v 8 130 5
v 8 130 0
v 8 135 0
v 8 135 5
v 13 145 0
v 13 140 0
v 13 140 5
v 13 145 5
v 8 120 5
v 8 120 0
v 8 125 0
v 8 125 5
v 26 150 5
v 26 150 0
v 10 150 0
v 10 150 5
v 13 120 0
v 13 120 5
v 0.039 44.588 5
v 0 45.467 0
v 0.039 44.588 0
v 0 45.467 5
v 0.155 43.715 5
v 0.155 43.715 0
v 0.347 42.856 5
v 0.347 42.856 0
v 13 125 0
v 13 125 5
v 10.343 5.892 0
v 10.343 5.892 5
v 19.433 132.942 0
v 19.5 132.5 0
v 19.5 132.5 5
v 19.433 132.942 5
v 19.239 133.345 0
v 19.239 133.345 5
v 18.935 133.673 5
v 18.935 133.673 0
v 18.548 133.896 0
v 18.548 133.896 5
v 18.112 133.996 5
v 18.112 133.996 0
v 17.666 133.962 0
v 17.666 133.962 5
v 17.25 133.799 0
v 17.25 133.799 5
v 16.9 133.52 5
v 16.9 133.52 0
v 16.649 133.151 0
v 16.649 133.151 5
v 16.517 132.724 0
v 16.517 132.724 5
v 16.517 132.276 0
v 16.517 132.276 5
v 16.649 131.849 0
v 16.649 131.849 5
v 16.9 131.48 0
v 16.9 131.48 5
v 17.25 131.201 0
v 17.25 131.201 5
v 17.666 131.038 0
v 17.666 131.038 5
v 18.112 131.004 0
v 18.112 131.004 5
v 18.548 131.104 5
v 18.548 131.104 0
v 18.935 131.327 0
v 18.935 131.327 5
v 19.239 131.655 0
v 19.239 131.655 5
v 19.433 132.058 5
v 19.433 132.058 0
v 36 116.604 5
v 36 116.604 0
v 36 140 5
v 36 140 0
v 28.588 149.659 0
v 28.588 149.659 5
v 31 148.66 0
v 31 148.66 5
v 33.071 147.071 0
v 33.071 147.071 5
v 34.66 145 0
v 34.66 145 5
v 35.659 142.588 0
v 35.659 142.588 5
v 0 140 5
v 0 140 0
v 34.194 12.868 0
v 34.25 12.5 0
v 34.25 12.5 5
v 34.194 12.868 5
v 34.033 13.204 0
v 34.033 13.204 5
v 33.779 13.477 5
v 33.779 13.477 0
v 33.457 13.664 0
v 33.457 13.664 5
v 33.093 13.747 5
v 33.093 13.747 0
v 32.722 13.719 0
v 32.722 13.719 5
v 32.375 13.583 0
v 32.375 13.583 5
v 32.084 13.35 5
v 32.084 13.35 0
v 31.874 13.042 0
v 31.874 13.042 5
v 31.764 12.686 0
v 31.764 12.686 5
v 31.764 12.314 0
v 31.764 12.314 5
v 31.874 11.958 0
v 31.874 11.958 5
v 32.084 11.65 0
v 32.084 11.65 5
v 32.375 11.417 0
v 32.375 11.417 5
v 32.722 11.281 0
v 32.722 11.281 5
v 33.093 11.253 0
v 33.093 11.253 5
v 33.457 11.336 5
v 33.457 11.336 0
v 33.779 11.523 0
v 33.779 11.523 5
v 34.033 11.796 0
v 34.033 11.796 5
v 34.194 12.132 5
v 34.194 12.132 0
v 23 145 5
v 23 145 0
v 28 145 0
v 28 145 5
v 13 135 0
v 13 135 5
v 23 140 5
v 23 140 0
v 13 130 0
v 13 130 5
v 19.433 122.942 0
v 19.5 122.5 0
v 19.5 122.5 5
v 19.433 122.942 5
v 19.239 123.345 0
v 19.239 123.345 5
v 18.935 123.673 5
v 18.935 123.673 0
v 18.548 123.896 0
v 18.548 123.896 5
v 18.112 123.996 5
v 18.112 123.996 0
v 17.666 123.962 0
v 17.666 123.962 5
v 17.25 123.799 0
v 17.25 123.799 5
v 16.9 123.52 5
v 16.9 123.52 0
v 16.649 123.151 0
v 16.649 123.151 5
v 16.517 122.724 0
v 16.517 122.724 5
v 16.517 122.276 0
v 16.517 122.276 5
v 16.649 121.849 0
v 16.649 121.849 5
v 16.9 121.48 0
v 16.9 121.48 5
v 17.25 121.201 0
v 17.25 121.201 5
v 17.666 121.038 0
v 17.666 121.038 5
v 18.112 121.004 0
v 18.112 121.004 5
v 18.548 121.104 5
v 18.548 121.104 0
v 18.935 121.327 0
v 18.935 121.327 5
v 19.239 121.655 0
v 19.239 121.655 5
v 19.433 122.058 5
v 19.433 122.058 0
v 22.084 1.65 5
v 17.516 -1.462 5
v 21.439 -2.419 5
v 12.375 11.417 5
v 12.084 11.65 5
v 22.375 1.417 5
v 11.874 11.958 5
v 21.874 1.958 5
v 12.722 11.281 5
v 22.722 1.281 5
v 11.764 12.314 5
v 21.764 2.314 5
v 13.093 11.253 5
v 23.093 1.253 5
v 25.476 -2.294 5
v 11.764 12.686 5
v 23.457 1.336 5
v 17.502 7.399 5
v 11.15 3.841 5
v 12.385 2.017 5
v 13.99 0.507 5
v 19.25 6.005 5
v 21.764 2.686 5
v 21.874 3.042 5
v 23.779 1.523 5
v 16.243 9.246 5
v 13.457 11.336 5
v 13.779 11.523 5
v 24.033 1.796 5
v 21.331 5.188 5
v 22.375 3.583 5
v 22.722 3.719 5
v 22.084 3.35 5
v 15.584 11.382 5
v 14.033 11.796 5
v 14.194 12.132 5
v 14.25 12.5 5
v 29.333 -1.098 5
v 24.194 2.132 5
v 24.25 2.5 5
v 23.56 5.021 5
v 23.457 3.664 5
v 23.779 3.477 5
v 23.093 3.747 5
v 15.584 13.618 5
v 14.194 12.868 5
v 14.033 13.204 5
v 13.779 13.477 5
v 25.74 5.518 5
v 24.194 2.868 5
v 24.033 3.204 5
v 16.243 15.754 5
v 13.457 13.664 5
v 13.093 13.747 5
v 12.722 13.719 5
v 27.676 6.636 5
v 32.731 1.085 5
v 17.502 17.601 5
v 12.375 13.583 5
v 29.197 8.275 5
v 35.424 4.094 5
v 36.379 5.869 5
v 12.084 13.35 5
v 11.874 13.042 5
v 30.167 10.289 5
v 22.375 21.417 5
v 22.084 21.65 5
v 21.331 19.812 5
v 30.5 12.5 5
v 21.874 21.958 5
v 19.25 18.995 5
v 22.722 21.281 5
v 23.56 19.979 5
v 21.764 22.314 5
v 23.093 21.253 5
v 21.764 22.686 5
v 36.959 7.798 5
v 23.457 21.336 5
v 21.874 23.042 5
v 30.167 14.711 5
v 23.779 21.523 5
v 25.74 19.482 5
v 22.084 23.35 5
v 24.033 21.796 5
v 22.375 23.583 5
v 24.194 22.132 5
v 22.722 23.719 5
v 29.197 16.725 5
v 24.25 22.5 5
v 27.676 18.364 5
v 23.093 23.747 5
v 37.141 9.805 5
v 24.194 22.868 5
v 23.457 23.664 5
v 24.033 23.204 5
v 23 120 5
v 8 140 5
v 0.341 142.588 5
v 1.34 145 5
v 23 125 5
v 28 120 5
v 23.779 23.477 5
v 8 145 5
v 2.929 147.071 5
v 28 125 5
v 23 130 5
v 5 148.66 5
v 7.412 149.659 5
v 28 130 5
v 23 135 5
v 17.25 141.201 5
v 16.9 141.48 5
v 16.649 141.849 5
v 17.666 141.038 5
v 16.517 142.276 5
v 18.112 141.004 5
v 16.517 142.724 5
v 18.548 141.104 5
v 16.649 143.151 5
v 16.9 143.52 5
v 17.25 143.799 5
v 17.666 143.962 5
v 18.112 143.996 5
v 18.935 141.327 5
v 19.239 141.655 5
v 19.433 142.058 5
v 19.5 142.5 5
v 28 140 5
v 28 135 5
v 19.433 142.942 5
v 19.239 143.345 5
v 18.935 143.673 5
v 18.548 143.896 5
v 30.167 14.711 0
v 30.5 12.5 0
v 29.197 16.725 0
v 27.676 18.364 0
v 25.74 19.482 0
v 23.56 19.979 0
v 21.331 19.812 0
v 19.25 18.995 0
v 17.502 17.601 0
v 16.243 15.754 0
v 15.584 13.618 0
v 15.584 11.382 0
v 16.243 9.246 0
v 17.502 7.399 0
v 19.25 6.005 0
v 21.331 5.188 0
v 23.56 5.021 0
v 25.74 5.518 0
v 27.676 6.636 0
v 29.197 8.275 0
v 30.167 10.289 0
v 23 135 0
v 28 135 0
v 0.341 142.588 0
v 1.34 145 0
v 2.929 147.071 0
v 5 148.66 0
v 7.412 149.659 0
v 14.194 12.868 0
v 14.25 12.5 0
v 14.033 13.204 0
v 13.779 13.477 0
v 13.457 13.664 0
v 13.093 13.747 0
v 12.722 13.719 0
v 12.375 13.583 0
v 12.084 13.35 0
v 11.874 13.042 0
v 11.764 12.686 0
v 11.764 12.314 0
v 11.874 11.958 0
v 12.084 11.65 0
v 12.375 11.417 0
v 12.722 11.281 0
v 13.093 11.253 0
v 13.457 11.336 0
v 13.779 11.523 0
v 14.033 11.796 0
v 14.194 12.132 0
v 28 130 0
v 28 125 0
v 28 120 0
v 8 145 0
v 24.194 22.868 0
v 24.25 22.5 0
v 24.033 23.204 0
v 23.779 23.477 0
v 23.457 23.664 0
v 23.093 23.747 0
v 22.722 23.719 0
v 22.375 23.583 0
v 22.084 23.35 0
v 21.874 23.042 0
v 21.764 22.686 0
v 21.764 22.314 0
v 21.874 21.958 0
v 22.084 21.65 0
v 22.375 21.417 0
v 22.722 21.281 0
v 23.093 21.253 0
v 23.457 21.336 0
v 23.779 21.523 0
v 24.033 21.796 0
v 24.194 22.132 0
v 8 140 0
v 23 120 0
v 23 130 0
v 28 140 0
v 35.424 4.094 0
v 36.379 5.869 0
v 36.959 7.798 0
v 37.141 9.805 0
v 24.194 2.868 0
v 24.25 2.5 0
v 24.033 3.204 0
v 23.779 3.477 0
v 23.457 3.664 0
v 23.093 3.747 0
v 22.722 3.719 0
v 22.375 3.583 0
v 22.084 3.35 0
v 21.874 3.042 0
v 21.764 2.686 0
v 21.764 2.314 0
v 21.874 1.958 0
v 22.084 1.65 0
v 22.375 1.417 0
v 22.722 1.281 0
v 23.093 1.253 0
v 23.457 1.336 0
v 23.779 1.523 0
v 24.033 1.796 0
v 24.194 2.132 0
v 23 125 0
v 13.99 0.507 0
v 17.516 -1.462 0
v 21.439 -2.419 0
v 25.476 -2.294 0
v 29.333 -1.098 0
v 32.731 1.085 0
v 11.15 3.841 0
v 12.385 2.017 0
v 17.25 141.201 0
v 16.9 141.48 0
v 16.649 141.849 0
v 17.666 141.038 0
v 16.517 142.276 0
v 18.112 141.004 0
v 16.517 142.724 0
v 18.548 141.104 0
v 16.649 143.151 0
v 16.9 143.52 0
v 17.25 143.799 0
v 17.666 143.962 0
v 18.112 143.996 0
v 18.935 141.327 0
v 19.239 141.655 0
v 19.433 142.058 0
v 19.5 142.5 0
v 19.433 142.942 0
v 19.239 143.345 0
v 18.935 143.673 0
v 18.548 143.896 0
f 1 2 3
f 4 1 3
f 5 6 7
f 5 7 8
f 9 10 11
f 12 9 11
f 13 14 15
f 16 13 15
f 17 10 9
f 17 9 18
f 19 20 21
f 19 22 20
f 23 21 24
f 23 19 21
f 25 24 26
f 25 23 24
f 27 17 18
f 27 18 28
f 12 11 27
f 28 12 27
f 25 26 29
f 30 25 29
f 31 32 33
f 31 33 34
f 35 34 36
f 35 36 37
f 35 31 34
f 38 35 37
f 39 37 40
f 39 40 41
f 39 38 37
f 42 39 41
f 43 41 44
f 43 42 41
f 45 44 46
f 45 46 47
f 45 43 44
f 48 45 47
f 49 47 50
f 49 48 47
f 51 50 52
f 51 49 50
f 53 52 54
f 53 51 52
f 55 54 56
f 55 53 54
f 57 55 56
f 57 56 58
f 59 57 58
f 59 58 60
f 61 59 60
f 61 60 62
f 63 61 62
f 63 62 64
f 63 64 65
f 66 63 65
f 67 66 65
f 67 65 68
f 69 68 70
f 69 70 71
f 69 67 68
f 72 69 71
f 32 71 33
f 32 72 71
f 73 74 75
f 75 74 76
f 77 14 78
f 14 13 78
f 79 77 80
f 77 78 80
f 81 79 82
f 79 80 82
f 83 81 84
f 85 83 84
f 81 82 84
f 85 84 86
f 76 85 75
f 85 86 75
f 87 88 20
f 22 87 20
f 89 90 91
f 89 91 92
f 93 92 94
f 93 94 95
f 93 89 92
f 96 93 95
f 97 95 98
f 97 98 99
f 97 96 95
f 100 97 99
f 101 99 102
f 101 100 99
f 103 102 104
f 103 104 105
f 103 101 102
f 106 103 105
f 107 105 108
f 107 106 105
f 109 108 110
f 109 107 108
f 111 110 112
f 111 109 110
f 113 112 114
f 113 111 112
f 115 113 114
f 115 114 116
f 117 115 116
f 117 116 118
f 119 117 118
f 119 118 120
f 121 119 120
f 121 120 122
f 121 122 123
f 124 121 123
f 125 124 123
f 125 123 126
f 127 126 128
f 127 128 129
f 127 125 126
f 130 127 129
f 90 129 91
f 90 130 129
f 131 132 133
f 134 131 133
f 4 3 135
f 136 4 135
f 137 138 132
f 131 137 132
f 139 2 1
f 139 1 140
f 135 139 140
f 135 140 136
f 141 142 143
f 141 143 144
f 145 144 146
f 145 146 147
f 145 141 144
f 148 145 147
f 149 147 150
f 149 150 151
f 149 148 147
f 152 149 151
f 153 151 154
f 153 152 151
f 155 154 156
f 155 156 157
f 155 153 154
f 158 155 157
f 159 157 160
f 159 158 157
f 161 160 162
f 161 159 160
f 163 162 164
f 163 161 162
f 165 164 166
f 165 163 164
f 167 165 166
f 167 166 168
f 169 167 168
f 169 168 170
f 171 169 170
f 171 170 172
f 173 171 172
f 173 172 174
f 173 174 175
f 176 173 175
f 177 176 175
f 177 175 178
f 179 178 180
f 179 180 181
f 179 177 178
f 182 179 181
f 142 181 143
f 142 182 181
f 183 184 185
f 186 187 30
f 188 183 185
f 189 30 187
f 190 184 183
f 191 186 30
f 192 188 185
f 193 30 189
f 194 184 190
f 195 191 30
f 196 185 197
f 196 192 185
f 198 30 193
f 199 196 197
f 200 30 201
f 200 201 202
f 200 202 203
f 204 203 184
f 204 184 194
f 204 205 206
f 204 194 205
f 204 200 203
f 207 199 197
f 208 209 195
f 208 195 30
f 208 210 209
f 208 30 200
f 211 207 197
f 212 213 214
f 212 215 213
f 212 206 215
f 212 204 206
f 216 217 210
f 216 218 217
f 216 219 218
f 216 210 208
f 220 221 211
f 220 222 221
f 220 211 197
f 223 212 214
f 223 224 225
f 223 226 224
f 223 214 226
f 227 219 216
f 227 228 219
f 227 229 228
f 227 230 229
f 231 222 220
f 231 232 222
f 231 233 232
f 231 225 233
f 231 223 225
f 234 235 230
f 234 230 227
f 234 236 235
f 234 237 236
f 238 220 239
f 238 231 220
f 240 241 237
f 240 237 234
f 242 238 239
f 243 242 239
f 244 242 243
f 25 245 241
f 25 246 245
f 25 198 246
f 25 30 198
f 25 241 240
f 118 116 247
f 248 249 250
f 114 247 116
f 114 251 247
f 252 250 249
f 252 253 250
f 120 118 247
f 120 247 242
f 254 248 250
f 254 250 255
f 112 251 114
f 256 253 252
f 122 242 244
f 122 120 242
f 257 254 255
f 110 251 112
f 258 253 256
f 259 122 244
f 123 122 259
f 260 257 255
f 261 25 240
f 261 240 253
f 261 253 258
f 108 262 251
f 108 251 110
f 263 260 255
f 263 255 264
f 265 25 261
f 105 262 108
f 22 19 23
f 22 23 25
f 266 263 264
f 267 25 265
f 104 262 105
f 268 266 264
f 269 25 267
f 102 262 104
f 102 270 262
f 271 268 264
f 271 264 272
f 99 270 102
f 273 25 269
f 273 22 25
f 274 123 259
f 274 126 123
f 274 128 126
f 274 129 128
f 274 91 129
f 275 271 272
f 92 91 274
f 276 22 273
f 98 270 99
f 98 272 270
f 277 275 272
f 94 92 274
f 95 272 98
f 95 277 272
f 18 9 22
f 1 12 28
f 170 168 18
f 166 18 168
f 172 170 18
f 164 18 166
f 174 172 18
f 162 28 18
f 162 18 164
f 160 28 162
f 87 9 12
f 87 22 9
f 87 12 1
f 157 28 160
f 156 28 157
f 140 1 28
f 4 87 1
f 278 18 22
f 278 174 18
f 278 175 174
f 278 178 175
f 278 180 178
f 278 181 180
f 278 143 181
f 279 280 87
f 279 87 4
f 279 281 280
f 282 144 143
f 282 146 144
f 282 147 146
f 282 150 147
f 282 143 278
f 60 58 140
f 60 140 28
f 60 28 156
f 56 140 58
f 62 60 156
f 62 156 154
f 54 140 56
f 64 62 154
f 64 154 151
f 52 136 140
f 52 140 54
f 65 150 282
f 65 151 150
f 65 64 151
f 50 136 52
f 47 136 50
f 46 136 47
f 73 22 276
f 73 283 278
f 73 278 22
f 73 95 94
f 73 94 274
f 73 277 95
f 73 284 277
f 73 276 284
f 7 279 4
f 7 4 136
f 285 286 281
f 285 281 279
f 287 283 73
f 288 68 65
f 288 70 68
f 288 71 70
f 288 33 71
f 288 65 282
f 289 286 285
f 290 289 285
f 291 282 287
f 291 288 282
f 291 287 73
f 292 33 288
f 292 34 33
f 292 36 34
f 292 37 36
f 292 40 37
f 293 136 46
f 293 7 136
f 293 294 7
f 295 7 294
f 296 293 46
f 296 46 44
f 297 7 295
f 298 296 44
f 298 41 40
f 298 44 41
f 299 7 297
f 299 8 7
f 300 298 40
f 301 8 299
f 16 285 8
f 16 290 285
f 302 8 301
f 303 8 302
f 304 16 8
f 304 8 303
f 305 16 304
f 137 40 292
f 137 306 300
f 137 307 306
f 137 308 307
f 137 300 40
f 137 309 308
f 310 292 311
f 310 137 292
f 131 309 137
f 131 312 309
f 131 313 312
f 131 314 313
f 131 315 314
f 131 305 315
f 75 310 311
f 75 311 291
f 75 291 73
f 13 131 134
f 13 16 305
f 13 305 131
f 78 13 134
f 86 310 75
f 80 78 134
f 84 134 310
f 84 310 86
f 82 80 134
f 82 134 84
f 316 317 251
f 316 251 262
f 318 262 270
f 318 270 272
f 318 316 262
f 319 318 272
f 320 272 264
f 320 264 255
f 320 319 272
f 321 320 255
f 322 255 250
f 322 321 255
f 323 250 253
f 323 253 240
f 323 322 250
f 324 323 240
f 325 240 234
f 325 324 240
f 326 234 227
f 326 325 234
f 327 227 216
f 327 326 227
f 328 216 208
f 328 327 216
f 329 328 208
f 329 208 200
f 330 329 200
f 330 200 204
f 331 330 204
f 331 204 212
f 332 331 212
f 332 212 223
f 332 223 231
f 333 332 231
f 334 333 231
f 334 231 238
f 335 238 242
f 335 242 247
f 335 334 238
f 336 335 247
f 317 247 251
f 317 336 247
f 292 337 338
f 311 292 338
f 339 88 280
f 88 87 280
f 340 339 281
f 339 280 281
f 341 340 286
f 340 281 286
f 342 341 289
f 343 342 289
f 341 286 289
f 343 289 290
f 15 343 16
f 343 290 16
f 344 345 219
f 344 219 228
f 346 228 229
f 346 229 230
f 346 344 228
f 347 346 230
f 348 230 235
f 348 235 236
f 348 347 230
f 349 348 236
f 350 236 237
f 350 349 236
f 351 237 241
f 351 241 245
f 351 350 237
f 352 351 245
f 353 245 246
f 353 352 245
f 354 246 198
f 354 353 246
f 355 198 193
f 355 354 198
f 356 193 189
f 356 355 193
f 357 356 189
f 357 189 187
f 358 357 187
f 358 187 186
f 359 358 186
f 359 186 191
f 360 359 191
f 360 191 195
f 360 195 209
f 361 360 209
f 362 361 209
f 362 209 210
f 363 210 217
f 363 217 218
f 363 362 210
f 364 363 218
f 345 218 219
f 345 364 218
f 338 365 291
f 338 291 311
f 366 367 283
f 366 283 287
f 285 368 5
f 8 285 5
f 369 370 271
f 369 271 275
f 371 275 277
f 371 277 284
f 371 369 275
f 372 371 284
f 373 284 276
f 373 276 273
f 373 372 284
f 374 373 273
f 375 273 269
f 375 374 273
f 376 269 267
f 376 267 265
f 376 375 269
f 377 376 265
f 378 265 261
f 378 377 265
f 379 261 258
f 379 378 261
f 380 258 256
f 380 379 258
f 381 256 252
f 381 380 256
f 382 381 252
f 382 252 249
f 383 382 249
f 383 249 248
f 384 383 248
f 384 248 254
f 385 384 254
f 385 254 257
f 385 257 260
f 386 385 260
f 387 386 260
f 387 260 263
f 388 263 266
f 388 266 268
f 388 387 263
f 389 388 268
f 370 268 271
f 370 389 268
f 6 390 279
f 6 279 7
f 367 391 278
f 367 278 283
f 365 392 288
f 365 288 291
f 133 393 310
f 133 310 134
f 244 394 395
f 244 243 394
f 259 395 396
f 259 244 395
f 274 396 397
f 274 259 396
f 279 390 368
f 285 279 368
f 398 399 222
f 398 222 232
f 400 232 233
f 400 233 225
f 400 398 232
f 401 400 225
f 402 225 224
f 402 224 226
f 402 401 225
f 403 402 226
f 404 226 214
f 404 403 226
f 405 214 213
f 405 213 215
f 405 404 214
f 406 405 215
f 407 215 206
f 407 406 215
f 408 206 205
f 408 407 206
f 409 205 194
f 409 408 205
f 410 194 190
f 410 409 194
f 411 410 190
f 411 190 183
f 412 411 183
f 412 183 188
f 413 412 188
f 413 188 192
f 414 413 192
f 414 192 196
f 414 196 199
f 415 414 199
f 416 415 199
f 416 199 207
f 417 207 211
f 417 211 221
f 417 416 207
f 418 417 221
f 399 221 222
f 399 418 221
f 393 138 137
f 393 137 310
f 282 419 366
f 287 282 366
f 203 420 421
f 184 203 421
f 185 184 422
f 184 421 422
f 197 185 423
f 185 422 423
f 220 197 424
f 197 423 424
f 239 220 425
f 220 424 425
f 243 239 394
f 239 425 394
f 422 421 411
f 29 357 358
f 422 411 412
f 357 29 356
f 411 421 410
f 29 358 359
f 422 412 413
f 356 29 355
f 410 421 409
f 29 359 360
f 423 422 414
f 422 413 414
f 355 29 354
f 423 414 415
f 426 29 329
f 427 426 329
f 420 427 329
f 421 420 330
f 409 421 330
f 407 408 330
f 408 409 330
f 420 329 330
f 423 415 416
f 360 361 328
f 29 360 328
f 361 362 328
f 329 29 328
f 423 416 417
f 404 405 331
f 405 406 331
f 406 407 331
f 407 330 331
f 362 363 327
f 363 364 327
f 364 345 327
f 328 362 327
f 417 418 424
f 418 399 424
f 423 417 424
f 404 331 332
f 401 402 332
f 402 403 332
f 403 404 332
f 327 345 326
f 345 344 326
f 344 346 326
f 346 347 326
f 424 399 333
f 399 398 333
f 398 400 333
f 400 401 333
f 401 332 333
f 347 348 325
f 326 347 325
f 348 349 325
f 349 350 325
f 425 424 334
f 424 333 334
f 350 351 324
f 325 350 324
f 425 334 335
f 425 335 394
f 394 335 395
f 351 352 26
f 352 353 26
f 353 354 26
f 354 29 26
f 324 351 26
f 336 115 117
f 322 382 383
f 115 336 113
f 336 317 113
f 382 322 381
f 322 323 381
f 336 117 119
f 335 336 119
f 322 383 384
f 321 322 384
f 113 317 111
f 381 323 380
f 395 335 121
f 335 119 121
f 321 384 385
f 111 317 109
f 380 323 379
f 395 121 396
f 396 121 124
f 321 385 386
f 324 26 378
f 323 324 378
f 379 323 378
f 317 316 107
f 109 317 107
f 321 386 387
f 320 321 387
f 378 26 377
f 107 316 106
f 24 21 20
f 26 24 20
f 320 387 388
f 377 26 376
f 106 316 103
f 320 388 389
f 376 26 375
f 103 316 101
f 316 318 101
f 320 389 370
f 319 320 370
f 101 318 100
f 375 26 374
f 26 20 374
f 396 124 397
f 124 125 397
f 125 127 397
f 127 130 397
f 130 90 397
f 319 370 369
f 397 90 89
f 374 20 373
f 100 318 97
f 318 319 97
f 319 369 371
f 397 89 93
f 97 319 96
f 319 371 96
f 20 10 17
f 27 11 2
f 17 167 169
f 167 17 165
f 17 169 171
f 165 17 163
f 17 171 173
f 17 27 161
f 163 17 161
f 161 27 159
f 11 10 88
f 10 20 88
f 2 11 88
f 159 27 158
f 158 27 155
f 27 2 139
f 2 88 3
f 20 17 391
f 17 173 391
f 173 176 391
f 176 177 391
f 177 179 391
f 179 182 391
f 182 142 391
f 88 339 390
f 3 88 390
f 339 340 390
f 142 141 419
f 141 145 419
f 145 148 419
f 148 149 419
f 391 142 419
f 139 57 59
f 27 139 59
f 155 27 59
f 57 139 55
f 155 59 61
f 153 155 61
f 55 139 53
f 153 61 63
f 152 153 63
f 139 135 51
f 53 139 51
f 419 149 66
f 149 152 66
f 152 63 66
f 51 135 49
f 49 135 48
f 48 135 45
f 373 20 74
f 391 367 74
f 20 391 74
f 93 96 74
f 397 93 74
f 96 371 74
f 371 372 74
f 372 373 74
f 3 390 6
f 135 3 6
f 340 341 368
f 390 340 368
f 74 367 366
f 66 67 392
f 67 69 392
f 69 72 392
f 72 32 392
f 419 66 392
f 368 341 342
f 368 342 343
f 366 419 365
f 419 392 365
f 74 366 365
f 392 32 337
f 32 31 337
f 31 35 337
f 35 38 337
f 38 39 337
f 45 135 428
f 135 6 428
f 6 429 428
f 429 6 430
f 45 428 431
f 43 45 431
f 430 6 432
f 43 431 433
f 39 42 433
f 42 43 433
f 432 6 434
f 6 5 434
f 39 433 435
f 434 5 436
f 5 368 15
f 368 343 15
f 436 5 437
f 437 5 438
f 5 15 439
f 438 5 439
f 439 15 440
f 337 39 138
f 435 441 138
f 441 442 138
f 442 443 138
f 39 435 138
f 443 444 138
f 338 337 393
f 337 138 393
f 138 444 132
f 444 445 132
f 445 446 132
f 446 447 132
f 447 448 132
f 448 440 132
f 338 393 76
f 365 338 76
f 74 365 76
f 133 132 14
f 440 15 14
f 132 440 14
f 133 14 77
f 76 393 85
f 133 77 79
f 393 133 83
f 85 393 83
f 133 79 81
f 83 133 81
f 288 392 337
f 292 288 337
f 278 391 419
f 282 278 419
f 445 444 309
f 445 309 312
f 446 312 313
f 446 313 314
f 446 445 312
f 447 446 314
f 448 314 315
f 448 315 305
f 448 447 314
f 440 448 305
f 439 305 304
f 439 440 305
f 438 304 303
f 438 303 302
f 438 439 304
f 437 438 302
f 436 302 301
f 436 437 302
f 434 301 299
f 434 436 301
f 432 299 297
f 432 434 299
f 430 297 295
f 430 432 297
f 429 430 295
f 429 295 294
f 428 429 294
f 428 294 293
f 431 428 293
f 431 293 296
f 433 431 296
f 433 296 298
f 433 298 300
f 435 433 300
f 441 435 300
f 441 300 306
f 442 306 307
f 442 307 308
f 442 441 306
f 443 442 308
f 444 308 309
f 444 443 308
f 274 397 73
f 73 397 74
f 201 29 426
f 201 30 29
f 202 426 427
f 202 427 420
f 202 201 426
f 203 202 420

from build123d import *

# Parameters (mm, degrees)
SKETCH1_R           = 7.5
SKETCH1_R_2         = 1.25
SKETCH1_R_3         = 1.5
SKETCH1_W           = 5
SKETCH1_H           = 5
BOSS_EXTRUDE1_DEPTH = 5
FILLET1_R           = 10
FILLET2_R           = 10


with BuildPart() as part:
    # Sketch1 → Boss-Extrude1 (new body)
    with BuildSketch(Plane.XY):
        with BuildLine():
            Line((0, 44.138584039), (10.984892076, 3.520179201))
            ThreePointArc((10.984892076, 3.520179201), (25.289734382, -2.324207111), (37.164554201, 7.563867476))
            Line((37.164554201, 7.563867476), (36, 116.603941586))
            Line((36, 116.603941586), (36, 150))
            Line((36, 150), (0, 150))
            Line((0, 150), (0, 44.138584039))
        make_face()
        with Locations((23, 12.5)):
            Circle(SKETCH1_R, mode=Mode.SUBTRACT)
        with Locations((23, 22.5)):
            Circle(SKETCH1_R_2, mode=Mode.SUBTRACT)
        with Locations((13, 12.5)):
            Circle(SKETCH1_R_2, mode=Mode.SUBTRACT)
        with Locations((23, 2.5)):
            Circle(SKETCH1_R_2, mode=Mode.SUBTRACT)
        with Locations((33, 12.5)):
            Circle(SKETCH1_R_2, mode=Mode.SUBTRACT)
        with Locations((18, 142.5)):
            Circle(SKETCH1_R_3, mode=Mode.SUBTRACT)
        with Locations((18, 122.5)):
            Circle(SKETCH1_R_3, mode=Mode.SUBTRACT)
        with Locations((18, 132.5)):
            Circle(SKETCH1_R_3, mode=Mode.SUBTRACT)
        with Locations((10.5, 142.5)):
            Rectangle(SKETCH1_W, SKETCH1_H, mode=Mode.SUBTRACT)
        with Locations((25.5, 142.5)):
            Rectangle(SKETCH1_W, SKETCH1_H, mode=Mode.SUBTRACT)
        with Locations((10.5, 122.5)):
            Rectangle(SKETCH1_W, SKETCH1_H, mode=Mode.SUBTRACT)
        with Locations((25.5, 122.5)):
            Rectangle(SKETCH1_W, SKETCH1_H, mode=Mode.SUBTRACT)
        with Locations((10.5, 132.5)):
            Rectangle(SKETCH1_W, SKETCH1_H, mode=Mode.SUBTRACT)
        with Locations((25.5, 132.5)):
            Rectangle(SKETCH1_W, SKETCH1_H, mode=Mode.SUBTRACT)
    extrude(amount=BOSS_EXTRUDE1_DEPTH)

    # Fillet1
    fillet1_edges = [part.edges().sort_by_distance(p)[0] for p in [
        (0, 150, 2.5),
        (36, 150, 2.5),
    ]]
    fillet(fillet1_edges, radius=FILLET1_R)

    # Fillet2
    fillet2_edges = [part.edges().sort_by_distance(p)[0] for p in [
        (10.984892076, 3.520179201, 2.5),
        (0, 44.138584039, 2.5),
        (36, 116.603941586, 2.5),
        (37.164554201, 7.563867476, 2.5),
    ]]
    fillet(fillet2_edges, radius=FILLET2_R)


solid = part.part
